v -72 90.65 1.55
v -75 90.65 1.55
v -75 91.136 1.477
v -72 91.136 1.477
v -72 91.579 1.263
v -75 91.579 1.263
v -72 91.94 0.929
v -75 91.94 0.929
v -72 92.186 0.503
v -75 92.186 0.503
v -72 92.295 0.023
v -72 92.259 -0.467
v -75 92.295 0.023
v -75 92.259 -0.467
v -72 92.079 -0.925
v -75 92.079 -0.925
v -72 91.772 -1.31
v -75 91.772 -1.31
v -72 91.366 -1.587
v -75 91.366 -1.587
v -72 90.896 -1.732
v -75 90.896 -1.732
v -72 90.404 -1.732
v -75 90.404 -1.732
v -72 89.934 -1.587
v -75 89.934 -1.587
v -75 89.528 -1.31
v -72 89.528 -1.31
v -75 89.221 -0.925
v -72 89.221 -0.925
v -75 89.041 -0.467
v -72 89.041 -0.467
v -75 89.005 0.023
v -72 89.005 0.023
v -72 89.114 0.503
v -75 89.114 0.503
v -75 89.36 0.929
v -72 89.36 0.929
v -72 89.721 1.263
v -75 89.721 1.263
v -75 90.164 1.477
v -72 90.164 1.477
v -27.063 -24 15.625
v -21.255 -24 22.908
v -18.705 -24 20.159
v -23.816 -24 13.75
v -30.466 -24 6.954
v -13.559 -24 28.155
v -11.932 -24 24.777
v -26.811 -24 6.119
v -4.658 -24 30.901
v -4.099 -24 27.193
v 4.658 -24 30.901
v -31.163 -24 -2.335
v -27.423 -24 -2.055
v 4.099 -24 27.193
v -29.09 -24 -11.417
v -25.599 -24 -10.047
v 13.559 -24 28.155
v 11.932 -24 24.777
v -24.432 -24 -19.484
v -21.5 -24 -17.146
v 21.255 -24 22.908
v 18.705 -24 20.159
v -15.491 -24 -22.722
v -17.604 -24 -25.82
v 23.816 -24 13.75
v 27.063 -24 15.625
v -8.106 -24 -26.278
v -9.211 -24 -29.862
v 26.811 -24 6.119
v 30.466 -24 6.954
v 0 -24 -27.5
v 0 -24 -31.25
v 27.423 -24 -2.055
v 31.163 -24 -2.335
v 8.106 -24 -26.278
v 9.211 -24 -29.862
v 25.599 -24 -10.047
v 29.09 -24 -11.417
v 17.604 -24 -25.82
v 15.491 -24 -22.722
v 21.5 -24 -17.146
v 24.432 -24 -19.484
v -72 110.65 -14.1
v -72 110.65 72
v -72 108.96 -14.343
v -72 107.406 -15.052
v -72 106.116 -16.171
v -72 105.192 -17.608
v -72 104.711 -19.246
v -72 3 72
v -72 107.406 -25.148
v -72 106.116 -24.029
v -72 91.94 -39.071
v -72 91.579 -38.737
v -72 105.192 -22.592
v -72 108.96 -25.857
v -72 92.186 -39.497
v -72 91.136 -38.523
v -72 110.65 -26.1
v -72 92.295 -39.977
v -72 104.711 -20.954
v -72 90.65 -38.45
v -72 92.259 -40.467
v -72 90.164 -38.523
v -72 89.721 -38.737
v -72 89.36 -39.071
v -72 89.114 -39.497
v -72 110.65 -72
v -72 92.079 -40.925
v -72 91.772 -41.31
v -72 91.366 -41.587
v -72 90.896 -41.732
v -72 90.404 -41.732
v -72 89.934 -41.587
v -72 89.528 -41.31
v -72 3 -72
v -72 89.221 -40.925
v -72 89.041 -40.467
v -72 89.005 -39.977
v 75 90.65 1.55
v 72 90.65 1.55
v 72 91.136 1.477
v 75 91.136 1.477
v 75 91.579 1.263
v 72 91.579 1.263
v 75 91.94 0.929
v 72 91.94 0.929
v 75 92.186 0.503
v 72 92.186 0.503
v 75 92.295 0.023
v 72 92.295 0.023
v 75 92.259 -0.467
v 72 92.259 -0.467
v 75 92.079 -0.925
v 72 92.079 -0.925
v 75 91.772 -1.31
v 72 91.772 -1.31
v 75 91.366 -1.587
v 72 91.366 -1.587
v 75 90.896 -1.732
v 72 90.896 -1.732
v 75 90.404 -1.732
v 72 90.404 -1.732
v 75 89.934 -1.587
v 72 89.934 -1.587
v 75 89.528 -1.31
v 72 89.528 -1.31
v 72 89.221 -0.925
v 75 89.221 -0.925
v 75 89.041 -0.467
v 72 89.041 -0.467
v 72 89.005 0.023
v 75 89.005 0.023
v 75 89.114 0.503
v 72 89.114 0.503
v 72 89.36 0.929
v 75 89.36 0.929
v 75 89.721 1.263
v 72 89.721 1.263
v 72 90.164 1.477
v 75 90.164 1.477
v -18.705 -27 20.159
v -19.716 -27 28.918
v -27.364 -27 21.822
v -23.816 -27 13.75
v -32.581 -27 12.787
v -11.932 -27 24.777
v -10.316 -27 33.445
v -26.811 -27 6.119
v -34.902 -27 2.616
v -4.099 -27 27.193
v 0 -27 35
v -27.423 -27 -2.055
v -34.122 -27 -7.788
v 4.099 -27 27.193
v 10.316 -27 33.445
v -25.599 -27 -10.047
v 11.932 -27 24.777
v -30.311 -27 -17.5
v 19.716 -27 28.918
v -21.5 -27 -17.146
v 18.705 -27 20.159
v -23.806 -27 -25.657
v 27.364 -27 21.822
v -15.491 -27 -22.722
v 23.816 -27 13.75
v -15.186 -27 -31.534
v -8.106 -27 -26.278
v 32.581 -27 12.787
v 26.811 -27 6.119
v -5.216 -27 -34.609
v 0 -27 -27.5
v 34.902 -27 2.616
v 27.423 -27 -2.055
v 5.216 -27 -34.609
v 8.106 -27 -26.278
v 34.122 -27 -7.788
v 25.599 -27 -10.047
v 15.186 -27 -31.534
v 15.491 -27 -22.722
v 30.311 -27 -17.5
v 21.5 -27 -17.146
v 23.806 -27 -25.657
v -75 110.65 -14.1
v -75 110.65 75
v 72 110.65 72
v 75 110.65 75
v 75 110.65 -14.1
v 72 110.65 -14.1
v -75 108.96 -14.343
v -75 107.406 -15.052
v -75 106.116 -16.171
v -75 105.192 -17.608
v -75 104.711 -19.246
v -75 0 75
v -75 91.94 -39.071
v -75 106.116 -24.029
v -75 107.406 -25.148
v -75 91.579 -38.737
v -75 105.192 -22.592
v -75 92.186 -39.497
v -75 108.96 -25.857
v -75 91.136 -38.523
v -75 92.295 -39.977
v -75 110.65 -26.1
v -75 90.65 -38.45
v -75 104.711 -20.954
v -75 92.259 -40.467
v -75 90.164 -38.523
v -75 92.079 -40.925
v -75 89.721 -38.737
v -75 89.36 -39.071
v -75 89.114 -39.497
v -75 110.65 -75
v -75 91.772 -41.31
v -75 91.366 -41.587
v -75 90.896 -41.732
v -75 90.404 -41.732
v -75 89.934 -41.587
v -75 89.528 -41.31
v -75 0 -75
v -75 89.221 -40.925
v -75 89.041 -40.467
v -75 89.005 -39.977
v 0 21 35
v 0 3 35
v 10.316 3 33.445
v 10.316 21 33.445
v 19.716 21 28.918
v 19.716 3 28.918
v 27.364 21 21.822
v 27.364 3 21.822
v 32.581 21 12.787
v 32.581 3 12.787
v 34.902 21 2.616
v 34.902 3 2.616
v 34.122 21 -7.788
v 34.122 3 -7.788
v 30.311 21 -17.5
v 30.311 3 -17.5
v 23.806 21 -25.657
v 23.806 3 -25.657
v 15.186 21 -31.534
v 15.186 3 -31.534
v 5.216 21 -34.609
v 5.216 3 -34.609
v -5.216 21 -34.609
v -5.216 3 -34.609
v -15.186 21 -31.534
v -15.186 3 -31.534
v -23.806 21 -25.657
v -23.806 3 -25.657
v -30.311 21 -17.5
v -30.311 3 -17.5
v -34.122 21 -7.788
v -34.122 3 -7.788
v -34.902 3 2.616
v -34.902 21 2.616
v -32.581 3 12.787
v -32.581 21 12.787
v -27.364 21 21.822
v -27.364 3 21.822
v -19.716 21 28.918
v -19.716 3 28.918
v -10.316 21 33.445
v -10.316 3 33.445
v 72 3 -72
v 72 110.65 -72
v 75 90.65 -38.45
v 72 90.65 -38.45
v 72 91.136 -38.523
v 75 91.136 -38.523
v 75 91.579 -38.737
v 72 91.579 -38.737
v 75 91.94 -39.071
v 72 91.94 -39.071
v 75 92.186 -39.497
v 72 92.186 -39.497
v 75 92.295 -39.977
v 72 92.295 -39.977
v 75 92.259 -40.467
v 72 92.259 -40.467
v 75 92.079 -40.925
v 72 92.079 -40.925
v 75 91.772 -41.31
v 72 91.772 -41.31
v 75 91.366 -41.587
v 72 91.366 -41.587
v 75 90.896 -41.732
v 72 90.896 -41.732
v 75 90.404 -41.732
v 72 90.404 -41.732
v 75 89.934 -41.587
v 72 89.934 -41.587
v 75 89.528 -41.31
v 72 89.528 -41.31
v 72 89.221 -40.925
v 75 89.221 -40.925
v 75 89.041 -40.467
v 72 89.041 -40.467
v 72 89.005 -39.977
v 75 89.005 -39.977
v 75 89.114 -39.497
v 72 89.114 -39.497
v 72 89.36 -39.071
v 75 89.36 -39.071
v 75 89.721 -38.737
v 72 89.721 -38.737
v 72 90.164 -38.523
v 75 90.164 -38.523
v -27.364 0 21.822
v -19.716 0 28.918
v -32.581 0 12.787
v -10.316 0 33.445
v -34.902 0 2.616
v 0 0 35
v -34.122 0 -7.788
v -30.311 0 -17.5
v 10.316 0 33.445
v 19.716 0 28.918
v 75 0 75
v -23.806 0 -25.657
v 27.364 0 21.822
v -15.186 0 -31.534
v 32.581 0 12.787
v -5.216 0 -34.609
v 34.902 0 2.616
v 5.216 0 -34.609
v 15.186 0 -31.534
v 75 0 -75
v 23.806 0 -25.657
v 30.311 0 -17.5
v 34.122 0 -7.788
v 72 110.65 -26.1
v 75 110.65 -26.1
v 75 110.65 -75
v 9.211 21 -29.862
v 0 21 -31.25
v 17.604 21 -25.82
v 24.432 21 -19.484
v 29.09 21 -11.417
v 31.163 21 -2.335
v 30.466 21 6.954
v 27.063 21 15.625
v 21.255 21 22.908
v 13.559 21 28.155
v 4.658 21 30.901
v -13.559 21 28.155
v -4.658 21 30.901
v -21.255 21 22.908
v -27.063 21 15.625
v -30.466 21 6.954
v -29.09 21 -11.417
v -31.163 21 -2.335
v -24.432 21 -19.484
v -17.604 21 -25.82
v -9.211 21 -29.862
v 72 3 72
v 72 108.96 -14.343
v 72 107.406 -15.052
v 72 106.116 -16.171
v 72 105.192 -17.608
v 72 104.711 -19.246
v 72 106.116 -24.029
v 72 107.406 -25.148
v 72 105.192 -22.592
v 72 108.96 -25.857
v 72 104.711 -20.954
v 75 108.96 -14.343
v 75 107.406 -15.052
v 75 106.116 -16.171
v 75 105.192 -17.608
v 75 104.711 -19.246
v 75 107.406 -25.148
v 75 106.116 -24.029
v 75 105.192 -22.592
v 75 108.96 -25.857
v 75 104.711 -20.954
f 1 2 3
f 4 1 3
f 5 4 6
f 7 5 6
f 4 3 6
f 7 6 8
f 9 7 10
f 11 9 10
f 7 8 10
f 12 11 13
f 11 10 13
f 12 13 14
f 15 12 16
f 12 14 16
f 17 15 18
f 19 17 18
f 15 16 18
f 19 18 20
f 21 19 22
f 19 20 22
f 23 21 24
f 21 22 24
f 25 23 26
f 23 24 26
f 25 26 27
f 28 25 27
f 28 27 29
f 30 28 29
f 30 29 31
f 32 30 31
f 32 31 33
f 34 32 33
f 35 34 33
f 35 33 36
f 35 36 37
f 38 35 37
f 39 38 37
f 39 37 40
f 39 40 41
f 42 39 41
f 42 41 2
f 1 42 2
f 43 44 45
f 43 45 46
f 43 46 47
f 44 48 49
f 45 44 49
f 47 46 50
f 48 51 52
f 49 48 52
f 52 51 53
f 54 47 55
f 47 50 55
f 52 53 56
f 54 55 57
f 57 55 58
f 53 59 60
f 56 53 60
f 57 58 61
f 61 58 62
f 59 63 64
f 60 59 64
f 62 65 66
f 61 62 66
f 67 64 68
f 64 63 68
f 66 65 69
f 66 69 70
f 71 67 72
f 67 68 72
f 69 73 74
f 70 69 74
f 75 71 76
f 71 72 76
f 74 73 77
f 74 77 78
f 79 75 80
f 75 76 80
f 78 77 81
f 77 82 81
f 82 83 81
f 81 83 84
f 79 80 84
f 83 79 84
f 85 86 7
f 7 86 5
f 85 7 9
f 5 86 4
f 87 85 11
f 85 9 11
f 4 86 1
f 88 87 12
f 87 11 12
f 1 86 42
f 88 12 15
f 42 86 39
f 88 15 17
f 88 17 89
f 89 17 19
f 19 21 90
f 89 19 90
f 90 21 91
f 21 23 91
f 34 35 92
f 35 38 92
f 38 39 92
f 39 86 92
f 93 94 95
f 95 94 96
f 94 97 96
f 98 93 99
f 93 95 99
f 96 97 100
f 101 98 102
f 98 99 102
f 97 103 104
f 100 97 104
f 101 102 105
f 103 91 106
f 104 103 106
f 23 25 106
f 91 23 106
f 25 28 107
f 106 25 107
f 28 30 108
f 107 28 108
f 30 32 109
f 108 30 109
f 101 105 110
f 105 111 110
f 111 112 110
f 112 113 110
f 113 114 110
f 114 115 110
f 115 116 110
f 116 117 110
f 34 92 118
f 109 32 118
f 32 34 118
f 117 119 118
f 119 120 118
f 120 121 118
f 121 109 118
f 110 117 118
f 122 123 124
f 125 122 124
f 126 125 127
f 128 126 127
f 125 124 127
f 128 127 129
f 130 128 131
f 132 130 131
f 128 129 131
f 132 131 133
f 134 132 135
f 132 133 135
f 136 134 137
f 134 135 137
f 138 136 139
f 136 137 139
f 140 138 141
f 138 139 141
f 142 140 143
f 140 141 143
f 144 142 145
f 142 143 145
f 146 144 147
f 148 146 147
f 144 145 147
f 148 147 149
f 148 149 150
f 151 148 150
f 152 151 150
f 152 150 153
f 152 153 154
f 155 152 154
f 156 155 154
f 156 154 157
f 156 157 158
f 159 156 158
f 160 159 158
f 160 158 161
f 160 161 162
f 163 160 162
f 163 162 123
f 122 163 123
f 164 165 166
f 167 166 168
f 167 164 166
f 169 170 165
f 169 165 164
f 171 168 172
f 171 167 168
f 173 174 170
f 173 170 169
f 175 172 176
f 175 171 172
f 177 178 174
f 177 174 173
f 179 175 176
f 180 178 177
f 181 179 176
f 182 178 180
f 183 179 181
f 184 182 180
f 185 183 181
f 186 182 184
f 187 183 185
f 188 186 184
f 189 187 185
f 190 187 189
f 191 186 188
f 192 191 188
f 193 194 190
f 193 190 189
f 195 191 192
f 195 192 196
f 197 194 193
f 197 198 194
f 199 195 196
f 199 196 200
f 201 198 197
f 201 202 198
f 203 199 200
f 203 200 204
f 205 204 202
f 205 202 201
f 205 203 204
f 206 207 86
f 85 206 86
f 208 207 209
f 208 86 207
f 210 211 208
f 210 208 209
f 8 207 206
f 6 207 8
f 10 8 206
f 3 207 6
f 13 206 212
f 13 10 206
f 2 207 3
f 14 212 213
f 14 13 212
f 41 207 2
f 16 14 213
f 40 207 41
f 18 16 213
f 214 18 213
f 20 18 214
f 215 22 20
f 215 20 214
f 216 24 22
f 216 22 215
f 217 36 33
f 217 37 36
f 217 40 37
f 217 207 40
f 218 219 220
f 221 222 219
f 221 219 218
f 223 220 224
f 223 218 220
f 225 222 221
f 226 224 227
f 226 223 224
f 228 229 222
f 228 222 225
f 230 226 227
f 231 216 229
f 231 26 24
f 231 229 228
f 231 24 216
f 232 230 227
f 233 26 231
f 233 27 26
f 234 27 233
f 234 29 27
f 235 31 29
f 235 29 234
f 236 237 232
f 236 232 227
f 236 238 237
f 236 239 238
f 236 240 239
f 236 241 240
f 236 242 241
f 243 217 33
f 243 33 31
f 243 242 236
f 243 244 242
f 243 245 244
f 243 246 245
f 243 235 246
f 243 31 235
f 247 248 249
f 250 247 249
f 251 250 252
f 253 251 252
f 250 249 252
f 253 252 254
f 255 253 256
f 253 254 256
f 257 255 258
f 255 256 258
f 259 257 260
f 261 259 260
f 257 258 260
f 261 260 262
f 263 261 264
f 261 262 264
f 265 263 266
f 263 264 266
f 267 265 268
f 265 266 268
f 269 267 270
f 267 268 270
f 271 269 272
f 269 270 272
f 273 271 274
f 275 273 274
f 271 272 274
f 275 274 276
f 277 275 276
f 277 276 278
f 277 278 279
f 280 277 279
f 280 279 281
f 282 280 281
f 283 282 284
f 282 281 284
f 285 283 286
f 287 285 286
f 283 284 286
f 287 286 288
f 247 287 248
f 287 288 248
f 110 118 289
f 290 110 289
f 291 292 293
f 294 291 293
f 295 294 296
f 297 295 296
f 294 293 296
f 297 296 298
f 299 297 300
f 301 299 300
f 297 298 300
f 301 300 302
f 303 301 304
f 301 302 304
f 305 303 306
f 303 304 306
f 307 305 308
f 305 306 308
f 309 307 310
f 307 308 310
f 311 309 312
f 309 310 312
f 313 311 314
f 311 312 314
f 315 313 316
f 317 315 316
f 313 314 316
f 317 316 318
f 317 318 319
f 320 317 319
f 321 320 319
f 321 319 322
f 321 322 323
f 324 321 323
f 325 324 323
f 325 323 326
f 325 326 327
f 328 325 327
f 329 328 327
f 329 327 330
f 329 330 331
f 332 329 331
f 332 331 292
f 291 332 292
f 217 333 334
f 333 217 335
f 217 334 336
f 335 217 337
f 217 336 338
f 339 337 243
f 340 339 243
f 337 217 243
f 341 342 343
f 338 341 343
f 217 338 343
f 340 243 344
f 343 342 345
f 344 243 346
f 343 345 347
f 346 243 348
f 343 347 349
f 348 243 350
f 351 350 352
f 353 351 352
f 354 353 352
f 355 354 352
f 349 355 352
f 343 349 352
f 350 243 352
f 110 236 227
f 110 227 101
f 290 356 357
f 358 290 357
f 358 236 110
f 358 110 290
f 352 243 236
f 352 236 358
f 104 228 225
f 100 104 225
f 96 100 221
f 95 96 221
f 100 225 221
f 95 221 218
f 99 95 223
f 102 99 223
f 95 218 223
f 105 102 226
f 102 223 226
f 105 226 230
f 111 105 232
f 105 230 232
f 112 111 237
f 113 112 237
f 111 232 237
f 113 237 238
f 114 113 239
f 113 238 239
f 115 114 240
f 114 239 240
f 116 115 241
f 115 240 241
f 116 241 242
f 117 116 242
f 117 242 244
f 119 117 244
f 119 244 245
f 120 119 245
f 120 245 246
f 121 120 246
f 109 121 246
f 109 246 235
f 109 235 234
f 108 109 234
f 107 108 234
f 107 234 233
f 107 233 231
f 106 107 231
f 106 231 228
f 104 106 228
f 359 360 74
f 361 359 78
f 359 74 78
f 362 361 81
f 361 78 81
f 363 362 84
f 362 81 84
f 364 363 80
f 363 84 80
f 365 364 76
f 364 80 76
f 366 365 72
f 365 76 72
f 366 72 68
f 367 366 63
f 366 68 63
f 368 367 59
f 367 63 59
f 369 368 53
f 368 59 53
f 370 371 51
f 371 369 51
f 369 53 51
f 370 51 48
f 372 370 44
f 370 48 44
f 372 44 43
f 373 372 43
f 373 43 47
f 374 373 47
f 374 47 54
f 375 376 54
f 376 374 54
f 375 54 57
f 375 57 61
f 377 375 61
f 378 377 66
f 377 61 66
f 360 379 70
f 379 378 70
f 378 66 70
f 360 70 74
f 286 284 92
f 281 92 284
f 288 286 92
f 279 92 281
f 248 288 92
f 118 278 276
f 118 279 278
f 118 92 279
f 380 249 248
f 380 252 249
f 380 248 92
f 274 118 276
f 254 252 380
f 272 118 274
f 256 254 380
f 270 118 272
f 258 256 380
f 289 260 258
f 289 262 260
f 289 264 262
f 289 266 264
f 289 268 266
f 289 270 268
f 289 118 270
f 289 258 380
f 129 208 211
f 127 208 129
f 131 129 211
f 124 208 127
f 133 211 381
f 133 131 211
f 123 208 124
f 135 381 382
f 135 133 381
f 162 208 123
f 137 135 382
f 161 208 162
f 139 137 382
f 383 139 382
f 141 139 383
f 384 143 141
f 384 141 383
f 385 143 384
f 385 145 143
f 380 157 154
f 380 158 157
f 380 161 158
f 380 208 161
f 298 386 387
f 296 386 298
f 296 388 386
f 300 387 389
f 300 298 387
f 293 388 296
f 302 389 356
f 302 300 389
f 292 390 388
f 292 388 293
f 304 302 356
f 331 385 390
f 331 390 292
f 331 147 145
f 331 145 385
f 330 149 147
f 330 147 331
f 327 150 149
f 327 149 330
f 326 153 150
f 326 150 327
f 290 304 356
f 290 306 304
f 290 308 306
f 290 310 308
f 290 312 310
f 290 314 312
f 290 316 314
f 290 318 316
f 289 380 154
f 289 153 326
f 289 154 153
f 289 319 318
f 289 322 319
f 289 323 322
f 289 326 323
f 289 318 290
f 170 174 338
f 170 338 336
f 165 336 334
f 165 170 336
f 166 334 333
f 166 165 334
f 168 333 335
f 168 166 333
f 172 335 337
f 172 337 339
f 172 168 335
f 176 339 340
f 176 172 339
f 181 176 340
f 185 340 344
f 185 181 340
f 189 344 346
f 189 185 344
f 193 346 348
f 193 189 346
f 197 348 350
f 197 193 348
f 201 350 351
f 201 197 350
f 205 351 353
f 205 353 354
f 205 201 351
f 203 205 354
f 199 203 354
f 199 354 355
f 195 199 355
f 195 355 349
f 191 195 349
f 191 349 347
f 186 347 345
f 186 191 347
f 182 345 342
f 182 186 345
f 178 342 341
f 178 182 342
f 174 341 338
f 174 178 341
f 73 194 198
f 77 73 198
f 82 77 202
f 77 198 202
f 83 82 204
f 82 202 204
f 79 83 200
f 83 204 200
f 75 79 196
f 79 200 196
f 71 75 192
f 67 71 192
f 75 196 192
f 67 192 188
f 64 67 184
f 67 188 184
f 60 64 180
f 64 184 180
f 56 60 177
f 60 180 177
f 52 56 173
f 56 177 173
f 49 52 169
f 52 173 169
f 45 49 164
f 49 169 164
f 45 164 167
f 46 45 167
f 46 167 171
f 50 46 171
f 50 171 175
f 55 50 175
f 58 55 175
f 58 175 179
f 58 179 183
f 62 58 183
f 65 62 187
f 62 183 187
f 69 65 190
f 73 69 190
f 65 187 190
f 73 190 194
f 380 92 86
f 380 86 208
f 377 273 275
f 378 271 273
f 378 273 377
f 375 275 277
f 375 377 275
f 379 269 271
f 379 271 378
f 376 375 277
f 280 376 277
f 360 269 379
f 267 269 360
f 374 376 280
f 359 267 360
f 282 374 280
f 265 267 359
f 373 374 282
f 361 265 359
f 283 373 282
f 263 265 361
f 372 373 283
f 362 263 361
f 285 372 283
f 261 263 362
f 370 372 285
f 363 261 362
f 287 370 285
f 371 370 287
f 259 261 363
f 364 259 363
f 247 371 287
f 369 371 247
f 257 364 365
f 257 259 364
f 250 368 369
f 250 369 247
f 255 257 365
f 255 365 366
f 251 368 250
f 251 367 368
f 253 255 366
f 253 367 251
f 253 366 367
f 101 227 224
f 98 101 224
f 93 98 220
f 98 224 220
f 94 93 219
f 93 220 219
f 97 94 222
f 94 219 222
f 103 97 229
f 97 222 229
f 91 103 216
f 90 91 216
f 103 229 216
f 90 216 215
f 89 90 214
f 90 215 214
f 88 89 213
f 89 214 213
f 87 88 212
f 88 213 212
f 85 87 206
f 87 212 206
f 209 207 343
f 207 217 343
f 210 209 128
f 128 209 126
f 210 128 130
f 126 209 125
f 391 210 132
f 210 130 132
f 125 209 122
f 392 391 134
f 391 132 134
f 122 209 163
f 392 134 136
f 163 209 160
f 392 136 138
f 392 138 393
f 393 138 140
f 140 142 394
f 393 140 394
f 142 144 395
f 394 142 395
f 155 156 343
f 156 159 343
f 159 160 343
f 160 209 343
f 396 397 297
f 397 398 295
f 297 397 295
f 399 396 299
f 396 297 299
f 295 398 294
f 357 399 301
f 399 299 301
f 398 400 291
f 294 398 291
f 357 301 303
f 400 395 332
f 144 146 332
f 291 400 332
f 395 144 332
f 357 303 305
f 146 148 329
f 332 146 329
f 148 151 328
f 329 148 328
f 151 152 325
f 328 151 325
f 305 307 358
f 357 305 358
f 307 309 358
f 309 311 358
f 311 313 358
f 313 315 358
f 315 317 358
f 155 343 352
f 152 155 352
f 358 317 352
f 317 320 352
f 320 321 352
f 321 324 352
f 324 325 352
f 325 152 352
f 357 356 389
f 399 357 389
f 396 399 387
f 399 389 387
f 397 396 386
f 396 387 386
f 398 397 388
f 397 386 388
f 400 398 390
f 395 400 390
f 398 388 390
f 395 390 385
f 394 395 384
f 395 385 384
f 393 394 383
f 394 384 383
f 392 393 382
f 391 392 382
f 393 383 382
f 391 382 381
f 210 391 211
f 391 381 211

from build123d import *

# Parameters (mm, degrees)
SKETCH_1_W          = 150
SKETCH_1_H          = 150
EXTRUDE_1_DEPTH     = 3
SKETCH_2_W          = 150
SKETCH_2_H          = 150
SKETCH_2_W_2        = 144
SKETCH_2_H_2        = 144
EXTRUDE_2_DEPTH     = 107.65
SKETCH_3_R          = 31.25
CUT_EXTRUDE_1_DEPTH = 91
SKETCH_4_R          = 6
CUT_EXTRUDE_2_DEPTH = 201.9189451
SKETCH_8_R          = 35
SKETCH_8_R_2        = 31.25
EXTRUDE_4_DEPTH     = 18
SKETCH_9_R          = 1.65
CUT_EXTRUDE_3_DEPTH = 201.9189451
EXTRUDE_START       = 27
SKETCH_14_R         = 35
SKETCH_14_R_2       = 31.25
EXTRUDE_7_DEPTH     = 27
SKETCH_15_R         = 31.25
SKETCH_15_R_2       = 27.5
EXTRUDE_8_DEPTH     = 3


with BuildPart() as part:
    # 草图1 → 凸台-拉伸1 (new body)
    with BuildSketch(Plane(origin=(0, 0, 0), x_dir=(1, 0, 0), z_dir=(0, 1, 0))):
        Rectangle(SKETCH_1_W, SKETCH_1_H)
    extrude(amount=EXTRUDE_1_DEPTH)

    # 草图2 → 凸台-拉伸2 (add)
    with BuildSketch(Plane(origin=(0, 3, 0), x_dir=(1, 0, 0), z_dir=(0, 1, 0))):
        Rectangle(SKETCH_2_W, SKETCH_2_H)
        Rectangle(SKETCH_2_W_2, SKETCH_2_H_2, mode=Mode.SUBTRACT)
    extrude(amount=EXTRUDE_2_DEPTH)

    # 草图3 → 切除-拉伸1 (cut)
    with BuildSketch(Plane.XZ):
        with Locations(Location((0, 0, 0), (0, 0, 270))):
            Circle(SKETCH_3_R)
    extrude(amount=-CUT_EXTRUDE_1_DEPTH, mode=Mode.SUBTRACT)

    # 草图4 → 切除-拉伸2 (cut, through all)
    with BuildSketch(Plane.ZY.offset(75)):
        with Locations((-20.1, 110.65)):
            Circle(SKETCH_4_R)
    extrude(amount=-CUT_EXTRUDE_2_DEPTH, mode=Mode.SUBTRACT)

    # 草图8 → 凸台-拉伸4 (add)
    with BuildSketch(Plane(origin=(0, 3, 0), x_dir=(1, 0, 0), z_dir=(0, 1, 0))):
        with Locations(Location((0, 0, 0), (0, 0, 270))):
            Circle(SKETCH_8_R)
        with Locations(Location((0, 0, 0), (0, 0, 90))):
            Circle(SKETCH_8_R_2, mode=Mode.SUBTRACT)
    extrude(amount=EXTRUDE_4_DEPTH)

    # 草图9 → 切除-拉伸3 (cut, through all)
    with BuildSketch(Plane.ZY.offset(75)):
        with Locations((-40.1, 90.65)):
            Circle(SKETCH_9_R)
        with Locations((-0.1, 90.65)):
            Circle(SKETCH_9_R)
    extrude(amount=-CUT_EXTRUDE_3_DEPTH, mode=Mode.SUBTRACT)

    # 草图14 → 凸台-拉伸7 (add)
    with BuildSketch(Plane.XZ.offset(EXTRUDE_START)):
        with Locations(Location((0, 0, 0), (0, 0, 90))):
            Circle(SKETCH_14_R)
        with Locations(Location((0, 0, 0), (0, 0, 270))):
            Circle(SKETCH_14_R_2, mode=Mode.SUBTRACT)
    extrude(amount=-EXTRUDE_7_DEPTH)

    # 草图15 → 凸台-拉伸8 (add)
    with BuildSketch(Plane.XZ.offset(27)):
        with Locations(Location((0, 0, 0), (0, 0, 270))):
            Circle(SKETCH_15_R)
        with Locations(Location((0, 0, 0), (0, 0, 270))):
            Circle(SKETCH_15_R_2, mode=Mode.SUBTRACT)
    extrude(amount=-EXTRUDE_8_DEPTH)


solid = part.part
